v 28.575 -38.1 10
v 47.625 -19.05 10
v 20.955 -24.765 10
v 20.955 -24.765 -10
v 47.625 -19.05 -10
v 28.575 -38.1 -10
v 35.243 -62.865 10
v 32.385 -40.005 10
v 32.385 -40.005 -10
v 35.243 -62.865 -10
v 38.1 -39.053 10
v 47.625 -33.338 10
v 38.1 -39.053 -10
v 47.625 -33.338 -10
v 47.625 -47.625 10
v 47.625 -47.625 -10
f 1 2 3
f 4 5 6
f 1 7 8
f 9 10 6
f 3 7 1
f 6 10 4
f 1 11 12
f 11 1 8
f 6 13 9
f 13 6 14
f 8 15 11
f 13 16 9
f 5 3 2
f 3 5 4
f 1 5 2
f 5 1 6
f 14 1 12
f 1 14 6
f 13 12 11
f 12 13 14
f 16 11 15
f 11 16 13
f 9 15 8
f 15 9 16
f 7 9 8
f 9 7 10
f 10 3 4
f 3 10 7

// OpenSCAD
polyhedron(
    points=[
    [20.955, -24.765, 10],
    [47.625, -19.05, 10],
    [28.575, -38.1, 10],
    [47.625, -33.3375, 10],
    [38.1, -39.0525, 10],
    [47.625, -47.625, 10],
    [32.385, -40.005, 10],
    [35.2425, -62.865, 10],
    [20.955, -24.765, -10],
    [47.625, -19.05, -10],
    [28.575, -38.1, -10],
    [47.625, -33.3375, -10],
    [38.1, -39.0525, -10],
    [47.625, -47.625, -10],
    [32.385, -40.005, -10],
    [35.2425, -62.865, -10],
    ],
    faces=[
        [0,1,2],
        [10,9,8],
        [6,7,2],
        [10,15,14],
        [2,7,0],
        [8,15,10],
        [2,3,4,6],
        [14,12,11,10],
        [4,5,6],
        [14,13,12],
        [0,8,9,1],
        [1,9,10,2],
        [2,10,11,3],
        [3,11,12,4],
        [4,12,13,5],
        [5,13,14,6],
        [6,14,15,7],
        [7,15,8,0],
    ]
);
